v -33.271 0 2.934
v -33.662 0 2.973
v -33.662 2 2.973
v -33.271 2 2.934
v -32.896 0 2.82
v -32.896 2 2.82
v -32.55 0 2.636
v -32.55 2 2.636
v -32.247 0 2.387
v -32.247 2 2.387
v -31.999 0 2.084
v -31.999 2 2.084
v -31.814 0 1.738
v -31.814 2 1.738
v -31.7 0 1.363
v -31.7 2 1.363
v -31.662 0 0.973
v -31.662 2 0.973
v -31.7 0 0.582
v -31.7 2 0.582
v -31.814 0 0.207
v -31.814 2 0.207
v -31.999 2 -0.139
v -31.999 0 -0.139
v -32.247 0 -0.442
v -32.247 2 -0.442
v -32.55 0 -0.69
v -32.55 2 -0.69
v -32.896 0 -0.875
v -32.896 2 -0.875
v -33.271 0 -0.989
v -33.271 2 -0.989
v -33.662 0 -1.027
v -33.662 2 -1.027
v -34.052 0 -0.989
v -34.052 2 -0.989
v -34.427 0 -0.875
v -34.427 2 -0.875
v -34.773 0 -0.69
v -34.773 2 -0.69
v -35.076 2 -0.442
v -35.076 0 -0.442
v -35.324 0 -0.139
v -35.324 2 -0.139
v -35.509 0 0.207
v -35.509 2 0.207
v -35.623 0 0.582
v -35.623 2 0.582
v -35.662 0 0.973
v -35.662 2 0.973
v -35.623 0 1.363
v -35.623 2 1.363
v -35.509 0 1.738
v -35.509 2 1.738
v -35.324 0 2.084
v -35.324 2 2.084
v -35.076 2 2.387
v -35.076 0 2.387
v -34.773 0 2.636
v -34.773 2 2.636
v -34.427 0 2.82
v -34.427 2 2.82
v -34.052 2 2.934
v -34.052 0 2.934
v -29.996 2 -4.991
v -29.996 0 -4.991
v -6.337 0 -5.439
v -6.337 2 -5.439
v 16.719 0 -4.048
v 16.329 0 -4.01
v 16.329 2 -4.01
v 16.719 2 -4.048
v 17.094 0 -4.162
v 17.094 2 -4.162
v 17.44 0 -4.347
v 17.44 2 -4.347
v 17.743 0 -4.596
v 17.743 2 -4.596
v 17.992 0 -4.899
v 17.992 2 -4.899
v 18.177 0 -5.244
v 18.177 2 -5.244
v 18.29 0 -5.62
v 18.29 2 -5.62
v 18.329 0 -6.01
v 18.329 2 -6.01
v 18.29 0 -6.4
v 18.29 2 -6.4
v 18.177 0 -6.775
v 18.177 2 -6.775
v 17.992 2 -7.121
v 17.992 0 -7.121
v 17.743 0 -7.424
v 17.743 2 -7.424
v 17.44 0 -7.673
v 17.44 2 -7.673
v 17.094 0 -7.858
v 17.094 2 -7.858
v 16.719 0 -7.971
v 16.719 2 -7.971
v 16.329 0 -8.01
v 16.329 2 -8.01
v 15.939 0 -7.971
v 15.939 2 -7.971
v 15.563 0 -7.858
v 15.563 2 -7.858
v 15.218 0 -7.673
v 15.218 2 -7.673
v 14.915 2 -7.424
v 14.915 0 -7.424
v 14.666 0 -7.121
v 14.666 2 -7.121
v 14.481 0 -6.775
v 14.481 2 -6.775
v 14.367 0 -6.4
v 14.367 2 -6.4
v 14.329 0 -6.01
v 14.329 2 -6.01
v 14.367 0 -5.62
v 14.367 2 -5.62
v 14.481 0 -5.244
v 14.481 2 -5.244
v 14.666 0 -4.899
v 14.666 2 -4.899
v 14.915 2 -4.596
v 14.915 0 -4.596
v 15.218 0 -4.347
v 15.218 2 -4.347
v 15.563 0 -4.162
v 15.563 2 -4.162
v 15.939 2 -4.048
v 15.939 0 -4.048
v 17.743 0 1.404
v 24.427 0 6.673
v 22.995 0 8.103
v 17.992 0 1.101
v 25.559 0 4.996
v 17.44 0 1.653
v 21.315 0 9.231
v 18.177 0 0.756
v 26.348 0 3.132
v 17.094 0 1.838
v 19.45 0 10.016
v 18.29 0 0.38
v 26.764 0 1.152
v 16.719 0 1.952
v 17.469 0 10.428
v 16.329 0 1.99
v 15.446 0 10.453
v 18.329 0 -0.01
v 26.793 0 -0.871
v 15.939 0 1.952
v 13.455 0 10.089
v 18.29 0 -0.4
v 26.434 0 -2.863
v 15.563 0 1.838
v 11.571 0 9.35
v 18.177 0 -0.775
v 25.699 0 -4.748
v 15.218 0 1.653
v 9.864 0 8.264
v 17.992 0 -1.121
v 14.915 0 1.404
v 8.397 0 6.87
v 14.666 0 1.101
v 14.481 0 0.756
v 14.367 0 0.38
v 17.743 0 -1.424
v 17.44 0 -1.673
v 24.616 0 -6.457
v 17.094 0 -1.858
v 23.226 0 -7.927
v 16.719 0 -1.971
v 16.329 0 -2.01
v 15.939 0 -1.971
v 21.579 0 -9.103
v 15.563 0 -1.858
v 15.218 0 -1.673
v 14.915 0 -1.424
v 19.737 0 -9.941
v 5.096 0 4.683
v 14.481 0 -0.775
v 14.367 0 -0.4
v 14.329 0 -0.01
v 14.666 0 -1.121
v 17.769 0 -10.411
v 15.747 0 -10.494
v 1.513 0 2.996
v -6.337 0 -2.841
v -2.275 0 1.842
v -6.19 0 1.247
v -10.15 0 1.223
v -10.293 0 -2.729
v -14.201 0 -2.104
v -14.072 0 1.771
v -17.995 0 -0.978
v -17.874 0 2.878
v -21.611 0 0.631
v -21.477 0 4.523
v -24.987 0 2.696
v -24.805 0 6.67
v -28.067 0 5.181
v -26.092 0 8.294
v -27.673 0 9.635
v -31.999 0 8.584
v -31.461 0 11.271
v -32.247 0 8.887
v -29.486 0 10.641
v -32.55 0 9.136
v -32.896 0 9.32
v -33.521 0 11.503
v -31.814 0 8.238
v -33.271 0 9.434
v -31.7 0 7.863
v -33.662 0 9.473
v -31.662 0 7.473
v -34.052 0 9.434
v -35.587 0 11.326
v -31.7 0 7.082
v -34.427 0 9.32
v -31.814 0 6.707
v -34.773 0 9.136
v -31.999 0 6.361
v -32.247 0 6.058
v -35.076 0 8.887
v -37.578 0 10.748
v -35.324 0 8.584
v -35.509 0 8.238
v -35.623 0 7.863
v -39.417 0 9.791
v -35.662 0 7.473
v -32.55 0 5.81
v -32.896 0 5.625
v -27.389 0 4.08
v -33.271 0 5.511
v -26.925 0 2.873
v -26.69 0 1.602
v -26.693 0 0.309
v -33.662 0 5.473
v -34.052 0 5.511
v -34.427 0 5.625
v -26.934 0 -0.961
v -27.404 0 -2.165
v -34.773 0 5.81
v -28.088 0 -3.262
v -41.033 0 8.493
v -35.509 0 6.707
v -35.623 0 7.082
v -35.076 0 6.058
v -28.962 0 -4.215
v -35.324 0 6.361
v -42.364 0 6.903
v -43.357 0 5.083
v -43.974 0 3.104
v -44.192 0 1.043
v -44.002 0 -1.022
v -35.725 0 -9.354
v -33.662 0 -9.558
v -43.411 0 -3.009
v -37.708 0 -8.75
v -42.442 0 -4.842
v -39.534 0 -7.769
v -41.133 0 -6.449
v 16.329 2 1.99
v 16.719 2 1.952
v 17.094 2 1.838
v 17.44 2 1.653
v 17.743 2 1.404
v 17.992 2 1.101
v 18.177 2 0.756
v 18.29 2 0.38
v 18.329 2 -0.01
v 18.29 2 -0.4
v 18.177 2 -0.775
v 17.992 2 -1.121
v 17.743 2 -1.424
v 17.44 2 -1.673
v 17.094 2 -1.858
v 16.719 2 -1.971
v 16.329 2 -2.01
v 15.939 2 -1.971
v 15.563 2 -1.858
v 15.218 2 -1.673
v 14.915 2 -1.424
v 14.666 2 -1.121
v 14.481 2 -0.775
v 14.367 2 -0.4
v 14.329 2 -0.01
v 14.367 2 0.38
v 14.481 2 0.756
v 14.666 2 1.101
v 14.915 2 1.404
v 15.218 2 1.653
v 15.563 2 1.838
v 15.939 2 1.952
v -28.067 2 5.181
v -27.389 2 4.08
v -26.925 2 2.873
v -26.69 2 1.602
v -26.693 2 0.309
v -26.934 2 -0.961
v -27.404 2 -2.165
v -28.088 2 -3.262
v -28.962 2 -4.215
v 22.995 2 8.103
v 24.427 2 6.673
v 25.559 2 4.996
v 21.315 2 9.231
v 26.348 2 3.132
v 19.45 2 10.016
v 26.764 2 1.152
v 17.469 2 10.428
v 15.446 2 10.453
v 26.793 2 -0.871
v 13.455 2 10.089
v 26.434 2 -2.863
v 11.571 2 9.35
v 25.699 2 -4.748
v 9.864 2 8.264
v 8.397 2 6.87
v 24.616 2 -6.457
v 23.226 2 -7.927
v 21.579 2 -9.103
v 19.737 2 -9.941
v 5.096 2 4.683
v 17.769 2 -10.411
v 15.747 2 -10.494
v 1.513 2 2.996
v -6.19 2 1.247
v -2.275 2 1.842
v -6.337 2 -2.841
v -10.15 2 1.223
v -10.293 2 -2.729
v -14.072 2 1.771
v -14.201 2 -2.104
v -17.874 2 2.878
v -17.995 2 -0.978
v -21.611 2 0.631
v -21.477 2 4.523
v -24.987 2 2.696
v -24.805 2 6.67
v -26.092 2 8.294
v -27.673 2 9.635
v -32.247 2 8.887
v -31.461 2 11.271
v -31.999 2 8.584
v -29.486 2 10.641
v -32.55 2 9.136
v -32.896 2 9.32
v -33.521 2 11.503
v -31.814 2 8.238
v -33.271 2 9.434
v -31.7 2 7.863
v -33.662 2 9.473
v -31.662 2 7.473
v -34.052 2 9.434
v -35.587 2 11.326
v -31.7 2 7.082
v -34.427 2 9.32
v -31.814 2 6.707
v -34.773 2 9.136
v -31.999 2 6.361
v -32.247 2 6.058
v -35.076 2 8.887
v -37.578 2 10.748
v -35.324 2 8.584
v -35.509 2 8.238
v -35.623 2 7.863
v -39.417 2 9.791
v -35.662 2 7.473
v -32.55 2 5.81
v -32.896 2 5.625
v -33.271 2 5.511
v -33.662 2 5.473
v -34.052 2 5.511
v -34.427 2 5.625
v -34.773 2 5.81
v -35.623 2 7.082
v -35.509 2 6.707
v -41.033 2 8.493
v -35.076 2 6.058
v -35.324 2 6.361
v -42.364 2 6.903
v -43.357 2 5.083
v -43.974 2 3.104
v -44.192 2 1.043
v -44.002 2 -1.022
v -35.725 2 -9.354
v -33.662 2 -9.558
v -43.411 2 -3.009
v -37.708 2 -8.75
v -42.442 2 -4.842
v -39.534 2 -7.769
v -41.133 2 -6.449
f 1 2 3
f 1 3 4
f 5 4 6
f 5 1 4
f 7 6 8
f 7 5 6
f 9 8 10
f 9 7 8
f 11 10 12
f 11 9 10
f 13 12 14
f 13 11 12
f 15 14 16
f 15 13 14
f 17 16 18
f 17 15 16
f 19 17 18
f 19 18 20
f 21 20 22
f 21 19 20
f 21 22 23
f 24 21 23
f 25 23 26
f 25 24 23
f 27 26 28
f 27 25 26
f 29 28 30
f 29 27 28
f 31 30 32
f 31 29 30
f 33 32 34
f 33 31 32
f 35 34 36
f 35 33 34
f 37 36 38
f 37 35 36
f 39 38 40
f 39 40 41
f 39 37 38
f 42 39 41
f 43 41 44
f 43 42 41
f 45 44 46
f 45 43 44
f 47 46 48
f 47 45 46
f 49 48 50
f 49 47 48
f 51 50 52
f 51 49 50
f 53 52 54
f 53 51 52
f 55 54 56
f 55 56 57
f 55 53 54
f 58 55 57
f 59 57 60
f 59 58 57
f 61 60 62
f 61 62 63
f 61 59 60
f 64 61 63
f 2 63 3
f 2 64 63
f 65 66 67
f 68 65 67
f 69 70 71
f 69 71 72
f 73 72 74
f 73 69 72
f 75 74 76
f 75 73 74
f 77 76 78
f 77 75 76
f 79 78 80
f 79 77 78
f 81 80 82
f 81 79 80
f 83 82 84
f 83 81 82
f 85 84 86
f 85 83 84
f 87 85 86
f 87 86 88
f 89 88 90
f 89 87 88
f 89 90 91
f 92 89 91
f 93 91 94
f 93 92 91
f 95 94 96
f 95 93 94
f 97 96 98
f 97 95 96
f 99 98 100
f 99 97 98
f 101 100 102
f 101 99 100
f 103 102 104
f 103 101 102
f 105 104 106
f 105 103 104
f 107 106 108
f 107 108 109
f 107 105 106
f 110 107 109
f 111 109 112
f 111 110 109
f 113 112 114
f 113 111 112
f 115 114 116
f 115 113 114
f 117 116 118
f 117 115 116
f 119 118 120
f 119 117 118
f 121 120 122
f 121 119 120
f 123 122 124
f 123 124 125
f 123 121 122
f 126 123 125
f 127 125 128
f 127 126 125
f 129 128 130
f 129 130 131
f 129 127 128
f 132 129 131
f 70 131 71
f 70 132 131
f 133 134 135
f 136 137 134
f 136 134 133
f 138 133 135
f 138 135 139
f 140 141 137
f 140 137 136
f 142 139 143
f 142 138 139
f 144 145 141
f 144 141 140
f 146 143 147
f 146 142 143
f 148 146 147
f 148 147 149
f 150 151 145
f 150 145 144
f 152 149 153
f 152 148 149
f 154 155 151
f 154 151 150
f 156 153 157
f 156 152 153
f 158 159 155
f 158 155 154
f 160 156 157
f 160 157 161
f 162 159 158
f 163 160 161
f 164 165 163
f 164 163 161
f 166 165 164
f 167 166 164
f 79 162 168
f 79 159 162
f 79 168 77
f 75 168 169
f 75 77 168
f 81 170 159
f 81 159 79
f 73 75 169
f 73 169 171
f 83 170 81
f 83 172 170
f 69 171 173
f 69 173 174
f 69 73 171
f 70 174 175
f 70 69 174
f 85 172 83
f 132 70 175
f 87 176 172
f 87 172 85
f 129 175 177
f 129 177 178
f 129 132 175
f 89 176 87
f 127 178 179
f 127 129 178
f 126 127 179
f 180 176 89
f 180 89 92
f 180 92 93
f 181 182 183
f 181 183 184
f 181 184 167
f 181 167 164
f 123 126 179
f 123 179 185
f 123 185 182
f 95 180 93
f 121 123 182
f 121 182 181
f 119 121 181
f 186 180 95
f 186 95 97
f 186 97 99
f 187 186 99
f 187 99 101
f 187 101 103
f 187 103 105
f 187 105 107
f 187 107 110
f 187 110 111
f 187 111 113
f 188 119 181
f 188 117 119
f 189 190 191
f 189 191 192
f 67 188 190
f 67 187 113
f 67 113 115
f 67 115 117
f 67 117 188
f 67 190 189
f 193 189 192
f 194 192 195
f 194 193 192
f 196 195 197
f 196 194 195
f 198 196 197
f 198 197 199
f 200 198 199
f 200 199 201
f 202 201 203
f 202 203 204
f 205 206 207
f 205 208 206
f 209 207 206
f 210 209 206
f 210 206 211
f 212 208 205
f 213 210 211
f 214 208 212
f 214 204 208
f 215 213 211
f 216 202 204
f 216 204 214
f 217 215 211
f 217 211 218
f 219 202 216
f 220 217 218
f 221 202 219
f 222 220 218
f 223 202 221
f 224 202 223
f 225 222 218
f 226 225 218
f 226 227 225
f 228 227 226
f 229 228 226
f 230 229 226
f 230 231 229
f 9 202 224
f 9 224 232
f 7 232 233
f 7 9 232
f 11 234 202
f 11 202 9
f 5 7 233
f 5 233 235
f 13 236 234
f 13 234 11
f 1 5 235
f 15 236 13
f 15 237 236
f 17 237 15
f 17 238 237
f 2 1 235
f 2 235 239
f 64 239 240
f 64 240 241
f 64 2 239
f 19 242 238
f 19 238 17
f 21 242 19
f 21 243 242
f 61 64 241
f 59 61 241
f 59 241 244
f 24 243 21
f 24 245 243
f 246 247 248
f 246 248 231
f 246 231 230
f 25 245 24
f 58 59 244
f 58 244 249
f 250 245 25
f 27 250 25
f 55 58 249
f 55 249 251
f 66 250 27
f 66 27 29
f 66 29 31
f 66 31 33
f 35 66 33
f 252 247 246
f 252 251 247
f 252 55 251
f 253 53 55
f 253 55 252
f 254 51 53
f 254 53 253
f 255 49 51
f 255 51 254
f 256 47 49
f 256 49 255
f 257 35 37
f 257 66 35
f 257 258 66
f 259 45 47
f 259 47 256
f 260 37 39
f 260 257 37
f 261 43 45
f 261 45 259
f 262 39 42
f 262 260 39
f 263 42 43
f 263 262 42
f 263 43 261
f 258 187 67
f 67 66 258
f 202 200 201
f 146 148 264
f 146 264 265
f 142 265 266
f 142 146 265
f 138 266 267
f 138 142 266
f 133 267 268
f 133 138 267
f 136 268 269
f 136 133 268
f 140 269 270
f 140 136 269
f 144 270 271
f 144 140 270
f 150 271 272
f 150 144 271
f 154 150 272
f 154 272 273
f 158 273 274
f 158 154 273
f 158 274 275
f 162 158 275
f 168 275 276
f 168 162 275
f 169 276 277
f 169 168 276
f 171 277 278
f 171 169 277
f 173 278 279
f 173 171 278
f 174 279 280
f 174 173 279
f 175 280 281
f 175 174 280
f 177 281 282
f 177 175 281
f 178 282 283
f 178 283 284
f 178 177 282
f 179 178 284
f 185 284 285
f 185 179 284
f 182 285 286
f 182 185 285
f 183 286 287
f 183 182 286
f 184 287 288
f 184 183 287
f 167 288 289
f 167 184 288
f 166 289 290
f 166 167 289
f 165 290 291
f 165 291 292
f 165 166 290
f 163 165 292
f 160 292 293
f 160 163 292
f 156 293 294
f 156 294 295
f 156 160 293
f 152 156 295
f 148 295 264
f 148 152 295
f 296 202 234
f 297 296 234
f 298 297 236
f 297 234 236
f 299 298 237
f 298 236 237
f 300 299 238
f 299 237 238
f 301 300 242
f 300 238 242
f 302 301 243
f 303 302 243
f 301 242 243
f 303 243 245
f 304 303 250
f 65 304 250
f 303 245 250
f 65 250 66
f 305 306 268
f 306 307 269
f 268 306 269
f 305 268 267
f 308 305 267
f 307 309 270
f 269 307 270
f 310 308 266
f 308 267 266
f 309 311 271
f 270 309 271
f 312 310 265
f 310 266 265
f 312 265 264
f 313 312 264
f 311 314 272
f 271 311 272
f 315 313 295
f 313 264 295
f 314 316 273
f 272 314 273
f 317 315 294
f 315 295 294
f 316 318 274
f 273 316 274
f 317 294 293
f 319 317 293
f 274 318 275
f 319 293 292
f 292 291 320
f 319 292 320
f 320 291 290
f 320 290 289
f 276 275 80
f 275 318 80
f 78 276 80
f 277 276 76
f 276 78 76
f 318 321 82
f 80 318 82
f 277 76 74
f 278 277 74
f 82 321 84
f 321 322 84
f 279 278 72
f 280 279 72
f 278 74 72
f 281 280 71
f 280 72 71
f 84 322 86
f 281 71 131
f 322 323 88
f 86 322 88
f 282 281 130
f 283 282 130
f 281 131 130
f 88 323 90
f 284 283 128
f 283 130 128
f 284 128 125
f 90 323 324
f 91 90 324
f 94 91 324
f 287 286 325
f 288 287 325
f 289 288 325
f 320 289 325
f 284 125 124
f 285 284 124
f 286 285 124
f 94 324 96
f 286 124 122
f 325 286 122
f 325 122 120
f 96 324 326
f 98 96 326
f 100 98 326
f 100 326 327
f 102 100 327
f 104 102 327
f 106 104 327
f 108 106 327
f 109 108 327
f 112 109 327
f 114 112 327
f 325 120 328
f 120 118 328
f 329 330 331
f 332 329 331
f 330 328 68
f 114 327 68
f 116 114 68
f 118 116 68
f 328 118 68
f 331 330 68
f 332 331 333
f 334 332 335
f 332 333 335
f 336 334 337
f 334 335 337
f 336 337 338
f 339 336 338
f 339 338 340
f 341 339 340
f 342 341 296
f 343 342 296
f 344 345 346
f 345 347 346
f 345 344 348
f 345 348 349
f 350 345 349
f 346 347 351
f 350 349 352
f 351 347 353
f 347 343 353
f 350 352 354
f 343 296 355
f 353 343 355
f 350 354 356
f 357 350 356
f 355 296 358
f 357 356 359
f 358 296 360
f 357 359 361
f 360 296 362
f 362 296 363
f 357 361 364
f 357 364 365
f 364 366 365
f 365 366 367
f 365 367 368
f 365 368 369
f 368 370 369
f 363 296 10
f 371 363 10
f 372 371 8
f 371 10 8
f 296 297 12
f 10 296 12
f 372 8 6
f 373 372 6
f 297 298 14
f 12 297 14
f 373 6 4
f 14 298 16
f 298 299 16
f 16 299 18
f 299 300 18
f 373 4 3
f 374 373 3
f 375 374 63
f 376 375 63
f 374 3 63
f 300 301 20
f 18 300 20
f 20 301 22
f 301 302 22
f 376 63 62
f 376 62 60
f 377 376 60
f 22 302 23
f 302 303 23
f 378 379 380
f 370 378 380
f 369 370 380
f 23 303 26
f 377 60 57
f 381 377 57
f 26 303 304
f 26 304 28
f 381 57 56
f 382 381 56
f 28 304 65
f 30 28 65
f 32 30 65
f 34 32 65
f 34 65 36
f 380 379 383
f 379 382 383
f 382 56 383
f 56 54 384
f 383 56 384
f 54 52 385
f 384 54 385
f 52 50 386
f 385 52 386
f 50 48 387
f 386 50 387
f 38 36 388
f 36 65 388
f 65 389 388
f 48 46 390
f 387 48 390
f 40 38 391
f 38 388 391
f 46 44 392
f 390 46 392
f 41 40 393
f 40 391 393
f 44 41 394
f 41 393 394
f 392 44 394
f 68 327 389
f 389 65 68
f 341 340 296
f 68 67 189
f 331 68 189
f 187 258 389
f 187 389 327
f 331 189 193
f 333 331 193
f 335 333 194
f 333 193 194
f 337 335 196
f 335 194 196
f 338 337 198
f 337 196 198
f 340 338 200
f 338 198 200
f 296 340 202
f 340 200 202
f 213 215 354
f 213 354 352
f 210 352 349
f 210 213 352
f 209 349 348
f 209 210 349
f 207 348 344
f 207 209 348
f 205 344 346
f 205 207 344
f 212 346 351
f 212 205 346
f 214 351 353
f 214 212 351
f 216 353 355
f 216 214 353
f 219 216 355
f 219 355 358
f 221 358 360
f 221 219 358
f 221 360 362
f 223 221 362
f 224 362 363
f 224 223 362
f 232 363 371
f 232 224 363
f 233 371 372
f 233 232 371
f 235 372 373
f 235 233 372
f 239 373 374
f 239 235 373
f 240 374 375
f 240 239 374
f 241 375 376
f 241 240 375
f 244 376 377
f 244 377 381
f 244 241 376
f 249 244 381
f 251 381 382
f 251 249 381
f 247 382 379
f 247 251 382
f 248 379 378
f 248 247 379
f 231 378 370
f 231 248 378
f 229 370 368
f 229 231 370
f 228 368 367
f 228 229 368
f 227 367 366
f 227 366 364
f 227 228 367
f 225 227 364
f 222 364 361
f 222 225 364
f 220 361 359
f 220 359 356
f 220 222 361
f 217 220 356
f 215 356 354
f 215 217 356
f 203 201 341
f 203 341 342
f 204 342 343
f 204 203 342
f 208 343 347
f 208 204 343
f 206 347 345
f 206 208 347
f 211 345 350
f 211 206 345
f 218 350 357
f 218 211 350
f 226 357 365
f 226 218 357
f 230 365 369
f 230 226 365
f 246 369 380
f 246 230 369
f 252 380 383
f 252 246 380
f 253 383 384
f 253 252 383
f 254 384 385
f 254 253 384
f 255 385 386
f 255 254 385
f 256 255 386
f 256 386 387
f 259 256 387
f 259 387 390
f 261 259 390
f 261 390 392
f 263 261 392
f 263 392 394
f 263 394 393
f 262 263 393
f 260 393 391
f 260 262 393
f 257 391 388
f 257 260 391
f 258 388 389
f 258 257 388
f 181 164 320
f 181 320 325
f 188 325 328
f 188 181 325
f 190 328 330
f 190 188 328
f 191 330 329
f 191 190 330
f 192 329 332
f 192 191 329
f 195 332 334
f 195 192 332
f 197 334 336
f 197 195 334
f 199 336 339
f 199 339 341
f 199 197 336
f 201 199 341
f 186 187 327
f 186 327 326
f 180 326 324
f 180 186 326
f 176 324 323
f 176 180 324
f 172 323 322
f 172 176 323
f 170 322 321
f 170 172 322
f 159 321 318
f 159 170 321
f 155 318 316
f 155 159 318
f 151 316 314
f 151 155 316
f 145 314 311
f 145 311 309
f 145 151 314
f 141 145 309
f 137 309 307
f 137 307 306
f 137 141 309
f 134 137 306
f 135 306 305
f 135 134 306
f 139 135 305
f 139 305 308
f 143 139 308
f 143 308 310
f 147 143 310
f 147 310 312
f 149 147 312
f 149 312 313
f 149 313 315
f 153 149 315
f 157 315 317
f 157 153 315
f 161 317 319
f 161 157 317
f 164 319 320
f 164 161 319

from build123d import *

# Parameters (mm, degrees)
SKETCH1_R           = 2
BOSS_EXTRUDE5_DEPTH = 2


with BuildPart() as part:
    # Sketch1 → Boss-Extrude5 (new body)
    with BuildSketch(Plane(origin=(0, 0, 0), x_dir=(1, 0, 0), z_dir=(0, 1, 0))):
        with BuildLine():
            Line((-33.661525998, 9.558347037), (15.746838945, 10.493683155))
            ThreePointArc((15.746838945, 10.493683155), (25.998283023, -4.08303674), (8.397040734, -6.870354169))
            ThreePointArc((8.397040734, -6.870354169), (-8.169868029, -1.163623151), (-24.804581512, -6.669579217))
            ThreePointArc((-24.804581512, -6.669579217), (-42.905321973, -6.017722997), (-33.661525998, 9.558347037))
        make_face()
        with Locations(Location((-33.661525998, -0.972605925, 0), (0, 0, 270))):
            Circle(SKETCH1_R, mode=Mode.SUBTRACT)
        with Locations(Location((-33.661525998, -7.472605925, 0), (0, 0, 270))):
            Circle(SKETCH1_R, mode=Mode.SUBTRACT)
        with Locations(Location((16.328821379, 0.009824302, 0), (0, 0, 270))):
            Circle(SKETCH1_R, mode=Mode.SUBTRACT)
        with Locations(Location((16.328821379, 6.009824302, 0), (0, 0, 270))):
            Circle(SKETCH1_R, mode=Mode.SUBTRACT)
        with BuildLine():
            Line((-29.996106609, 4.99100881), (-6.337353933, 5.438886126))
            Line((-6.337353933, 5.438886126), (-6.337353933, 2.841108528))
            ThreePointArc((-6.337353933, 2.841108528), (-17.995175719, 0.977836677), (-28.067473468, -5.180524211))
            ThreePointArc((-28.067473468, -5.180524211), (-26.784064544, 0.331435467), (-29.996106609, 4.99100881))
        make_face(mode=Mode.SUBTRACT)
    extrude(amount=BOSS_EXTRUDE5_DEPTH)


solid = part.part
